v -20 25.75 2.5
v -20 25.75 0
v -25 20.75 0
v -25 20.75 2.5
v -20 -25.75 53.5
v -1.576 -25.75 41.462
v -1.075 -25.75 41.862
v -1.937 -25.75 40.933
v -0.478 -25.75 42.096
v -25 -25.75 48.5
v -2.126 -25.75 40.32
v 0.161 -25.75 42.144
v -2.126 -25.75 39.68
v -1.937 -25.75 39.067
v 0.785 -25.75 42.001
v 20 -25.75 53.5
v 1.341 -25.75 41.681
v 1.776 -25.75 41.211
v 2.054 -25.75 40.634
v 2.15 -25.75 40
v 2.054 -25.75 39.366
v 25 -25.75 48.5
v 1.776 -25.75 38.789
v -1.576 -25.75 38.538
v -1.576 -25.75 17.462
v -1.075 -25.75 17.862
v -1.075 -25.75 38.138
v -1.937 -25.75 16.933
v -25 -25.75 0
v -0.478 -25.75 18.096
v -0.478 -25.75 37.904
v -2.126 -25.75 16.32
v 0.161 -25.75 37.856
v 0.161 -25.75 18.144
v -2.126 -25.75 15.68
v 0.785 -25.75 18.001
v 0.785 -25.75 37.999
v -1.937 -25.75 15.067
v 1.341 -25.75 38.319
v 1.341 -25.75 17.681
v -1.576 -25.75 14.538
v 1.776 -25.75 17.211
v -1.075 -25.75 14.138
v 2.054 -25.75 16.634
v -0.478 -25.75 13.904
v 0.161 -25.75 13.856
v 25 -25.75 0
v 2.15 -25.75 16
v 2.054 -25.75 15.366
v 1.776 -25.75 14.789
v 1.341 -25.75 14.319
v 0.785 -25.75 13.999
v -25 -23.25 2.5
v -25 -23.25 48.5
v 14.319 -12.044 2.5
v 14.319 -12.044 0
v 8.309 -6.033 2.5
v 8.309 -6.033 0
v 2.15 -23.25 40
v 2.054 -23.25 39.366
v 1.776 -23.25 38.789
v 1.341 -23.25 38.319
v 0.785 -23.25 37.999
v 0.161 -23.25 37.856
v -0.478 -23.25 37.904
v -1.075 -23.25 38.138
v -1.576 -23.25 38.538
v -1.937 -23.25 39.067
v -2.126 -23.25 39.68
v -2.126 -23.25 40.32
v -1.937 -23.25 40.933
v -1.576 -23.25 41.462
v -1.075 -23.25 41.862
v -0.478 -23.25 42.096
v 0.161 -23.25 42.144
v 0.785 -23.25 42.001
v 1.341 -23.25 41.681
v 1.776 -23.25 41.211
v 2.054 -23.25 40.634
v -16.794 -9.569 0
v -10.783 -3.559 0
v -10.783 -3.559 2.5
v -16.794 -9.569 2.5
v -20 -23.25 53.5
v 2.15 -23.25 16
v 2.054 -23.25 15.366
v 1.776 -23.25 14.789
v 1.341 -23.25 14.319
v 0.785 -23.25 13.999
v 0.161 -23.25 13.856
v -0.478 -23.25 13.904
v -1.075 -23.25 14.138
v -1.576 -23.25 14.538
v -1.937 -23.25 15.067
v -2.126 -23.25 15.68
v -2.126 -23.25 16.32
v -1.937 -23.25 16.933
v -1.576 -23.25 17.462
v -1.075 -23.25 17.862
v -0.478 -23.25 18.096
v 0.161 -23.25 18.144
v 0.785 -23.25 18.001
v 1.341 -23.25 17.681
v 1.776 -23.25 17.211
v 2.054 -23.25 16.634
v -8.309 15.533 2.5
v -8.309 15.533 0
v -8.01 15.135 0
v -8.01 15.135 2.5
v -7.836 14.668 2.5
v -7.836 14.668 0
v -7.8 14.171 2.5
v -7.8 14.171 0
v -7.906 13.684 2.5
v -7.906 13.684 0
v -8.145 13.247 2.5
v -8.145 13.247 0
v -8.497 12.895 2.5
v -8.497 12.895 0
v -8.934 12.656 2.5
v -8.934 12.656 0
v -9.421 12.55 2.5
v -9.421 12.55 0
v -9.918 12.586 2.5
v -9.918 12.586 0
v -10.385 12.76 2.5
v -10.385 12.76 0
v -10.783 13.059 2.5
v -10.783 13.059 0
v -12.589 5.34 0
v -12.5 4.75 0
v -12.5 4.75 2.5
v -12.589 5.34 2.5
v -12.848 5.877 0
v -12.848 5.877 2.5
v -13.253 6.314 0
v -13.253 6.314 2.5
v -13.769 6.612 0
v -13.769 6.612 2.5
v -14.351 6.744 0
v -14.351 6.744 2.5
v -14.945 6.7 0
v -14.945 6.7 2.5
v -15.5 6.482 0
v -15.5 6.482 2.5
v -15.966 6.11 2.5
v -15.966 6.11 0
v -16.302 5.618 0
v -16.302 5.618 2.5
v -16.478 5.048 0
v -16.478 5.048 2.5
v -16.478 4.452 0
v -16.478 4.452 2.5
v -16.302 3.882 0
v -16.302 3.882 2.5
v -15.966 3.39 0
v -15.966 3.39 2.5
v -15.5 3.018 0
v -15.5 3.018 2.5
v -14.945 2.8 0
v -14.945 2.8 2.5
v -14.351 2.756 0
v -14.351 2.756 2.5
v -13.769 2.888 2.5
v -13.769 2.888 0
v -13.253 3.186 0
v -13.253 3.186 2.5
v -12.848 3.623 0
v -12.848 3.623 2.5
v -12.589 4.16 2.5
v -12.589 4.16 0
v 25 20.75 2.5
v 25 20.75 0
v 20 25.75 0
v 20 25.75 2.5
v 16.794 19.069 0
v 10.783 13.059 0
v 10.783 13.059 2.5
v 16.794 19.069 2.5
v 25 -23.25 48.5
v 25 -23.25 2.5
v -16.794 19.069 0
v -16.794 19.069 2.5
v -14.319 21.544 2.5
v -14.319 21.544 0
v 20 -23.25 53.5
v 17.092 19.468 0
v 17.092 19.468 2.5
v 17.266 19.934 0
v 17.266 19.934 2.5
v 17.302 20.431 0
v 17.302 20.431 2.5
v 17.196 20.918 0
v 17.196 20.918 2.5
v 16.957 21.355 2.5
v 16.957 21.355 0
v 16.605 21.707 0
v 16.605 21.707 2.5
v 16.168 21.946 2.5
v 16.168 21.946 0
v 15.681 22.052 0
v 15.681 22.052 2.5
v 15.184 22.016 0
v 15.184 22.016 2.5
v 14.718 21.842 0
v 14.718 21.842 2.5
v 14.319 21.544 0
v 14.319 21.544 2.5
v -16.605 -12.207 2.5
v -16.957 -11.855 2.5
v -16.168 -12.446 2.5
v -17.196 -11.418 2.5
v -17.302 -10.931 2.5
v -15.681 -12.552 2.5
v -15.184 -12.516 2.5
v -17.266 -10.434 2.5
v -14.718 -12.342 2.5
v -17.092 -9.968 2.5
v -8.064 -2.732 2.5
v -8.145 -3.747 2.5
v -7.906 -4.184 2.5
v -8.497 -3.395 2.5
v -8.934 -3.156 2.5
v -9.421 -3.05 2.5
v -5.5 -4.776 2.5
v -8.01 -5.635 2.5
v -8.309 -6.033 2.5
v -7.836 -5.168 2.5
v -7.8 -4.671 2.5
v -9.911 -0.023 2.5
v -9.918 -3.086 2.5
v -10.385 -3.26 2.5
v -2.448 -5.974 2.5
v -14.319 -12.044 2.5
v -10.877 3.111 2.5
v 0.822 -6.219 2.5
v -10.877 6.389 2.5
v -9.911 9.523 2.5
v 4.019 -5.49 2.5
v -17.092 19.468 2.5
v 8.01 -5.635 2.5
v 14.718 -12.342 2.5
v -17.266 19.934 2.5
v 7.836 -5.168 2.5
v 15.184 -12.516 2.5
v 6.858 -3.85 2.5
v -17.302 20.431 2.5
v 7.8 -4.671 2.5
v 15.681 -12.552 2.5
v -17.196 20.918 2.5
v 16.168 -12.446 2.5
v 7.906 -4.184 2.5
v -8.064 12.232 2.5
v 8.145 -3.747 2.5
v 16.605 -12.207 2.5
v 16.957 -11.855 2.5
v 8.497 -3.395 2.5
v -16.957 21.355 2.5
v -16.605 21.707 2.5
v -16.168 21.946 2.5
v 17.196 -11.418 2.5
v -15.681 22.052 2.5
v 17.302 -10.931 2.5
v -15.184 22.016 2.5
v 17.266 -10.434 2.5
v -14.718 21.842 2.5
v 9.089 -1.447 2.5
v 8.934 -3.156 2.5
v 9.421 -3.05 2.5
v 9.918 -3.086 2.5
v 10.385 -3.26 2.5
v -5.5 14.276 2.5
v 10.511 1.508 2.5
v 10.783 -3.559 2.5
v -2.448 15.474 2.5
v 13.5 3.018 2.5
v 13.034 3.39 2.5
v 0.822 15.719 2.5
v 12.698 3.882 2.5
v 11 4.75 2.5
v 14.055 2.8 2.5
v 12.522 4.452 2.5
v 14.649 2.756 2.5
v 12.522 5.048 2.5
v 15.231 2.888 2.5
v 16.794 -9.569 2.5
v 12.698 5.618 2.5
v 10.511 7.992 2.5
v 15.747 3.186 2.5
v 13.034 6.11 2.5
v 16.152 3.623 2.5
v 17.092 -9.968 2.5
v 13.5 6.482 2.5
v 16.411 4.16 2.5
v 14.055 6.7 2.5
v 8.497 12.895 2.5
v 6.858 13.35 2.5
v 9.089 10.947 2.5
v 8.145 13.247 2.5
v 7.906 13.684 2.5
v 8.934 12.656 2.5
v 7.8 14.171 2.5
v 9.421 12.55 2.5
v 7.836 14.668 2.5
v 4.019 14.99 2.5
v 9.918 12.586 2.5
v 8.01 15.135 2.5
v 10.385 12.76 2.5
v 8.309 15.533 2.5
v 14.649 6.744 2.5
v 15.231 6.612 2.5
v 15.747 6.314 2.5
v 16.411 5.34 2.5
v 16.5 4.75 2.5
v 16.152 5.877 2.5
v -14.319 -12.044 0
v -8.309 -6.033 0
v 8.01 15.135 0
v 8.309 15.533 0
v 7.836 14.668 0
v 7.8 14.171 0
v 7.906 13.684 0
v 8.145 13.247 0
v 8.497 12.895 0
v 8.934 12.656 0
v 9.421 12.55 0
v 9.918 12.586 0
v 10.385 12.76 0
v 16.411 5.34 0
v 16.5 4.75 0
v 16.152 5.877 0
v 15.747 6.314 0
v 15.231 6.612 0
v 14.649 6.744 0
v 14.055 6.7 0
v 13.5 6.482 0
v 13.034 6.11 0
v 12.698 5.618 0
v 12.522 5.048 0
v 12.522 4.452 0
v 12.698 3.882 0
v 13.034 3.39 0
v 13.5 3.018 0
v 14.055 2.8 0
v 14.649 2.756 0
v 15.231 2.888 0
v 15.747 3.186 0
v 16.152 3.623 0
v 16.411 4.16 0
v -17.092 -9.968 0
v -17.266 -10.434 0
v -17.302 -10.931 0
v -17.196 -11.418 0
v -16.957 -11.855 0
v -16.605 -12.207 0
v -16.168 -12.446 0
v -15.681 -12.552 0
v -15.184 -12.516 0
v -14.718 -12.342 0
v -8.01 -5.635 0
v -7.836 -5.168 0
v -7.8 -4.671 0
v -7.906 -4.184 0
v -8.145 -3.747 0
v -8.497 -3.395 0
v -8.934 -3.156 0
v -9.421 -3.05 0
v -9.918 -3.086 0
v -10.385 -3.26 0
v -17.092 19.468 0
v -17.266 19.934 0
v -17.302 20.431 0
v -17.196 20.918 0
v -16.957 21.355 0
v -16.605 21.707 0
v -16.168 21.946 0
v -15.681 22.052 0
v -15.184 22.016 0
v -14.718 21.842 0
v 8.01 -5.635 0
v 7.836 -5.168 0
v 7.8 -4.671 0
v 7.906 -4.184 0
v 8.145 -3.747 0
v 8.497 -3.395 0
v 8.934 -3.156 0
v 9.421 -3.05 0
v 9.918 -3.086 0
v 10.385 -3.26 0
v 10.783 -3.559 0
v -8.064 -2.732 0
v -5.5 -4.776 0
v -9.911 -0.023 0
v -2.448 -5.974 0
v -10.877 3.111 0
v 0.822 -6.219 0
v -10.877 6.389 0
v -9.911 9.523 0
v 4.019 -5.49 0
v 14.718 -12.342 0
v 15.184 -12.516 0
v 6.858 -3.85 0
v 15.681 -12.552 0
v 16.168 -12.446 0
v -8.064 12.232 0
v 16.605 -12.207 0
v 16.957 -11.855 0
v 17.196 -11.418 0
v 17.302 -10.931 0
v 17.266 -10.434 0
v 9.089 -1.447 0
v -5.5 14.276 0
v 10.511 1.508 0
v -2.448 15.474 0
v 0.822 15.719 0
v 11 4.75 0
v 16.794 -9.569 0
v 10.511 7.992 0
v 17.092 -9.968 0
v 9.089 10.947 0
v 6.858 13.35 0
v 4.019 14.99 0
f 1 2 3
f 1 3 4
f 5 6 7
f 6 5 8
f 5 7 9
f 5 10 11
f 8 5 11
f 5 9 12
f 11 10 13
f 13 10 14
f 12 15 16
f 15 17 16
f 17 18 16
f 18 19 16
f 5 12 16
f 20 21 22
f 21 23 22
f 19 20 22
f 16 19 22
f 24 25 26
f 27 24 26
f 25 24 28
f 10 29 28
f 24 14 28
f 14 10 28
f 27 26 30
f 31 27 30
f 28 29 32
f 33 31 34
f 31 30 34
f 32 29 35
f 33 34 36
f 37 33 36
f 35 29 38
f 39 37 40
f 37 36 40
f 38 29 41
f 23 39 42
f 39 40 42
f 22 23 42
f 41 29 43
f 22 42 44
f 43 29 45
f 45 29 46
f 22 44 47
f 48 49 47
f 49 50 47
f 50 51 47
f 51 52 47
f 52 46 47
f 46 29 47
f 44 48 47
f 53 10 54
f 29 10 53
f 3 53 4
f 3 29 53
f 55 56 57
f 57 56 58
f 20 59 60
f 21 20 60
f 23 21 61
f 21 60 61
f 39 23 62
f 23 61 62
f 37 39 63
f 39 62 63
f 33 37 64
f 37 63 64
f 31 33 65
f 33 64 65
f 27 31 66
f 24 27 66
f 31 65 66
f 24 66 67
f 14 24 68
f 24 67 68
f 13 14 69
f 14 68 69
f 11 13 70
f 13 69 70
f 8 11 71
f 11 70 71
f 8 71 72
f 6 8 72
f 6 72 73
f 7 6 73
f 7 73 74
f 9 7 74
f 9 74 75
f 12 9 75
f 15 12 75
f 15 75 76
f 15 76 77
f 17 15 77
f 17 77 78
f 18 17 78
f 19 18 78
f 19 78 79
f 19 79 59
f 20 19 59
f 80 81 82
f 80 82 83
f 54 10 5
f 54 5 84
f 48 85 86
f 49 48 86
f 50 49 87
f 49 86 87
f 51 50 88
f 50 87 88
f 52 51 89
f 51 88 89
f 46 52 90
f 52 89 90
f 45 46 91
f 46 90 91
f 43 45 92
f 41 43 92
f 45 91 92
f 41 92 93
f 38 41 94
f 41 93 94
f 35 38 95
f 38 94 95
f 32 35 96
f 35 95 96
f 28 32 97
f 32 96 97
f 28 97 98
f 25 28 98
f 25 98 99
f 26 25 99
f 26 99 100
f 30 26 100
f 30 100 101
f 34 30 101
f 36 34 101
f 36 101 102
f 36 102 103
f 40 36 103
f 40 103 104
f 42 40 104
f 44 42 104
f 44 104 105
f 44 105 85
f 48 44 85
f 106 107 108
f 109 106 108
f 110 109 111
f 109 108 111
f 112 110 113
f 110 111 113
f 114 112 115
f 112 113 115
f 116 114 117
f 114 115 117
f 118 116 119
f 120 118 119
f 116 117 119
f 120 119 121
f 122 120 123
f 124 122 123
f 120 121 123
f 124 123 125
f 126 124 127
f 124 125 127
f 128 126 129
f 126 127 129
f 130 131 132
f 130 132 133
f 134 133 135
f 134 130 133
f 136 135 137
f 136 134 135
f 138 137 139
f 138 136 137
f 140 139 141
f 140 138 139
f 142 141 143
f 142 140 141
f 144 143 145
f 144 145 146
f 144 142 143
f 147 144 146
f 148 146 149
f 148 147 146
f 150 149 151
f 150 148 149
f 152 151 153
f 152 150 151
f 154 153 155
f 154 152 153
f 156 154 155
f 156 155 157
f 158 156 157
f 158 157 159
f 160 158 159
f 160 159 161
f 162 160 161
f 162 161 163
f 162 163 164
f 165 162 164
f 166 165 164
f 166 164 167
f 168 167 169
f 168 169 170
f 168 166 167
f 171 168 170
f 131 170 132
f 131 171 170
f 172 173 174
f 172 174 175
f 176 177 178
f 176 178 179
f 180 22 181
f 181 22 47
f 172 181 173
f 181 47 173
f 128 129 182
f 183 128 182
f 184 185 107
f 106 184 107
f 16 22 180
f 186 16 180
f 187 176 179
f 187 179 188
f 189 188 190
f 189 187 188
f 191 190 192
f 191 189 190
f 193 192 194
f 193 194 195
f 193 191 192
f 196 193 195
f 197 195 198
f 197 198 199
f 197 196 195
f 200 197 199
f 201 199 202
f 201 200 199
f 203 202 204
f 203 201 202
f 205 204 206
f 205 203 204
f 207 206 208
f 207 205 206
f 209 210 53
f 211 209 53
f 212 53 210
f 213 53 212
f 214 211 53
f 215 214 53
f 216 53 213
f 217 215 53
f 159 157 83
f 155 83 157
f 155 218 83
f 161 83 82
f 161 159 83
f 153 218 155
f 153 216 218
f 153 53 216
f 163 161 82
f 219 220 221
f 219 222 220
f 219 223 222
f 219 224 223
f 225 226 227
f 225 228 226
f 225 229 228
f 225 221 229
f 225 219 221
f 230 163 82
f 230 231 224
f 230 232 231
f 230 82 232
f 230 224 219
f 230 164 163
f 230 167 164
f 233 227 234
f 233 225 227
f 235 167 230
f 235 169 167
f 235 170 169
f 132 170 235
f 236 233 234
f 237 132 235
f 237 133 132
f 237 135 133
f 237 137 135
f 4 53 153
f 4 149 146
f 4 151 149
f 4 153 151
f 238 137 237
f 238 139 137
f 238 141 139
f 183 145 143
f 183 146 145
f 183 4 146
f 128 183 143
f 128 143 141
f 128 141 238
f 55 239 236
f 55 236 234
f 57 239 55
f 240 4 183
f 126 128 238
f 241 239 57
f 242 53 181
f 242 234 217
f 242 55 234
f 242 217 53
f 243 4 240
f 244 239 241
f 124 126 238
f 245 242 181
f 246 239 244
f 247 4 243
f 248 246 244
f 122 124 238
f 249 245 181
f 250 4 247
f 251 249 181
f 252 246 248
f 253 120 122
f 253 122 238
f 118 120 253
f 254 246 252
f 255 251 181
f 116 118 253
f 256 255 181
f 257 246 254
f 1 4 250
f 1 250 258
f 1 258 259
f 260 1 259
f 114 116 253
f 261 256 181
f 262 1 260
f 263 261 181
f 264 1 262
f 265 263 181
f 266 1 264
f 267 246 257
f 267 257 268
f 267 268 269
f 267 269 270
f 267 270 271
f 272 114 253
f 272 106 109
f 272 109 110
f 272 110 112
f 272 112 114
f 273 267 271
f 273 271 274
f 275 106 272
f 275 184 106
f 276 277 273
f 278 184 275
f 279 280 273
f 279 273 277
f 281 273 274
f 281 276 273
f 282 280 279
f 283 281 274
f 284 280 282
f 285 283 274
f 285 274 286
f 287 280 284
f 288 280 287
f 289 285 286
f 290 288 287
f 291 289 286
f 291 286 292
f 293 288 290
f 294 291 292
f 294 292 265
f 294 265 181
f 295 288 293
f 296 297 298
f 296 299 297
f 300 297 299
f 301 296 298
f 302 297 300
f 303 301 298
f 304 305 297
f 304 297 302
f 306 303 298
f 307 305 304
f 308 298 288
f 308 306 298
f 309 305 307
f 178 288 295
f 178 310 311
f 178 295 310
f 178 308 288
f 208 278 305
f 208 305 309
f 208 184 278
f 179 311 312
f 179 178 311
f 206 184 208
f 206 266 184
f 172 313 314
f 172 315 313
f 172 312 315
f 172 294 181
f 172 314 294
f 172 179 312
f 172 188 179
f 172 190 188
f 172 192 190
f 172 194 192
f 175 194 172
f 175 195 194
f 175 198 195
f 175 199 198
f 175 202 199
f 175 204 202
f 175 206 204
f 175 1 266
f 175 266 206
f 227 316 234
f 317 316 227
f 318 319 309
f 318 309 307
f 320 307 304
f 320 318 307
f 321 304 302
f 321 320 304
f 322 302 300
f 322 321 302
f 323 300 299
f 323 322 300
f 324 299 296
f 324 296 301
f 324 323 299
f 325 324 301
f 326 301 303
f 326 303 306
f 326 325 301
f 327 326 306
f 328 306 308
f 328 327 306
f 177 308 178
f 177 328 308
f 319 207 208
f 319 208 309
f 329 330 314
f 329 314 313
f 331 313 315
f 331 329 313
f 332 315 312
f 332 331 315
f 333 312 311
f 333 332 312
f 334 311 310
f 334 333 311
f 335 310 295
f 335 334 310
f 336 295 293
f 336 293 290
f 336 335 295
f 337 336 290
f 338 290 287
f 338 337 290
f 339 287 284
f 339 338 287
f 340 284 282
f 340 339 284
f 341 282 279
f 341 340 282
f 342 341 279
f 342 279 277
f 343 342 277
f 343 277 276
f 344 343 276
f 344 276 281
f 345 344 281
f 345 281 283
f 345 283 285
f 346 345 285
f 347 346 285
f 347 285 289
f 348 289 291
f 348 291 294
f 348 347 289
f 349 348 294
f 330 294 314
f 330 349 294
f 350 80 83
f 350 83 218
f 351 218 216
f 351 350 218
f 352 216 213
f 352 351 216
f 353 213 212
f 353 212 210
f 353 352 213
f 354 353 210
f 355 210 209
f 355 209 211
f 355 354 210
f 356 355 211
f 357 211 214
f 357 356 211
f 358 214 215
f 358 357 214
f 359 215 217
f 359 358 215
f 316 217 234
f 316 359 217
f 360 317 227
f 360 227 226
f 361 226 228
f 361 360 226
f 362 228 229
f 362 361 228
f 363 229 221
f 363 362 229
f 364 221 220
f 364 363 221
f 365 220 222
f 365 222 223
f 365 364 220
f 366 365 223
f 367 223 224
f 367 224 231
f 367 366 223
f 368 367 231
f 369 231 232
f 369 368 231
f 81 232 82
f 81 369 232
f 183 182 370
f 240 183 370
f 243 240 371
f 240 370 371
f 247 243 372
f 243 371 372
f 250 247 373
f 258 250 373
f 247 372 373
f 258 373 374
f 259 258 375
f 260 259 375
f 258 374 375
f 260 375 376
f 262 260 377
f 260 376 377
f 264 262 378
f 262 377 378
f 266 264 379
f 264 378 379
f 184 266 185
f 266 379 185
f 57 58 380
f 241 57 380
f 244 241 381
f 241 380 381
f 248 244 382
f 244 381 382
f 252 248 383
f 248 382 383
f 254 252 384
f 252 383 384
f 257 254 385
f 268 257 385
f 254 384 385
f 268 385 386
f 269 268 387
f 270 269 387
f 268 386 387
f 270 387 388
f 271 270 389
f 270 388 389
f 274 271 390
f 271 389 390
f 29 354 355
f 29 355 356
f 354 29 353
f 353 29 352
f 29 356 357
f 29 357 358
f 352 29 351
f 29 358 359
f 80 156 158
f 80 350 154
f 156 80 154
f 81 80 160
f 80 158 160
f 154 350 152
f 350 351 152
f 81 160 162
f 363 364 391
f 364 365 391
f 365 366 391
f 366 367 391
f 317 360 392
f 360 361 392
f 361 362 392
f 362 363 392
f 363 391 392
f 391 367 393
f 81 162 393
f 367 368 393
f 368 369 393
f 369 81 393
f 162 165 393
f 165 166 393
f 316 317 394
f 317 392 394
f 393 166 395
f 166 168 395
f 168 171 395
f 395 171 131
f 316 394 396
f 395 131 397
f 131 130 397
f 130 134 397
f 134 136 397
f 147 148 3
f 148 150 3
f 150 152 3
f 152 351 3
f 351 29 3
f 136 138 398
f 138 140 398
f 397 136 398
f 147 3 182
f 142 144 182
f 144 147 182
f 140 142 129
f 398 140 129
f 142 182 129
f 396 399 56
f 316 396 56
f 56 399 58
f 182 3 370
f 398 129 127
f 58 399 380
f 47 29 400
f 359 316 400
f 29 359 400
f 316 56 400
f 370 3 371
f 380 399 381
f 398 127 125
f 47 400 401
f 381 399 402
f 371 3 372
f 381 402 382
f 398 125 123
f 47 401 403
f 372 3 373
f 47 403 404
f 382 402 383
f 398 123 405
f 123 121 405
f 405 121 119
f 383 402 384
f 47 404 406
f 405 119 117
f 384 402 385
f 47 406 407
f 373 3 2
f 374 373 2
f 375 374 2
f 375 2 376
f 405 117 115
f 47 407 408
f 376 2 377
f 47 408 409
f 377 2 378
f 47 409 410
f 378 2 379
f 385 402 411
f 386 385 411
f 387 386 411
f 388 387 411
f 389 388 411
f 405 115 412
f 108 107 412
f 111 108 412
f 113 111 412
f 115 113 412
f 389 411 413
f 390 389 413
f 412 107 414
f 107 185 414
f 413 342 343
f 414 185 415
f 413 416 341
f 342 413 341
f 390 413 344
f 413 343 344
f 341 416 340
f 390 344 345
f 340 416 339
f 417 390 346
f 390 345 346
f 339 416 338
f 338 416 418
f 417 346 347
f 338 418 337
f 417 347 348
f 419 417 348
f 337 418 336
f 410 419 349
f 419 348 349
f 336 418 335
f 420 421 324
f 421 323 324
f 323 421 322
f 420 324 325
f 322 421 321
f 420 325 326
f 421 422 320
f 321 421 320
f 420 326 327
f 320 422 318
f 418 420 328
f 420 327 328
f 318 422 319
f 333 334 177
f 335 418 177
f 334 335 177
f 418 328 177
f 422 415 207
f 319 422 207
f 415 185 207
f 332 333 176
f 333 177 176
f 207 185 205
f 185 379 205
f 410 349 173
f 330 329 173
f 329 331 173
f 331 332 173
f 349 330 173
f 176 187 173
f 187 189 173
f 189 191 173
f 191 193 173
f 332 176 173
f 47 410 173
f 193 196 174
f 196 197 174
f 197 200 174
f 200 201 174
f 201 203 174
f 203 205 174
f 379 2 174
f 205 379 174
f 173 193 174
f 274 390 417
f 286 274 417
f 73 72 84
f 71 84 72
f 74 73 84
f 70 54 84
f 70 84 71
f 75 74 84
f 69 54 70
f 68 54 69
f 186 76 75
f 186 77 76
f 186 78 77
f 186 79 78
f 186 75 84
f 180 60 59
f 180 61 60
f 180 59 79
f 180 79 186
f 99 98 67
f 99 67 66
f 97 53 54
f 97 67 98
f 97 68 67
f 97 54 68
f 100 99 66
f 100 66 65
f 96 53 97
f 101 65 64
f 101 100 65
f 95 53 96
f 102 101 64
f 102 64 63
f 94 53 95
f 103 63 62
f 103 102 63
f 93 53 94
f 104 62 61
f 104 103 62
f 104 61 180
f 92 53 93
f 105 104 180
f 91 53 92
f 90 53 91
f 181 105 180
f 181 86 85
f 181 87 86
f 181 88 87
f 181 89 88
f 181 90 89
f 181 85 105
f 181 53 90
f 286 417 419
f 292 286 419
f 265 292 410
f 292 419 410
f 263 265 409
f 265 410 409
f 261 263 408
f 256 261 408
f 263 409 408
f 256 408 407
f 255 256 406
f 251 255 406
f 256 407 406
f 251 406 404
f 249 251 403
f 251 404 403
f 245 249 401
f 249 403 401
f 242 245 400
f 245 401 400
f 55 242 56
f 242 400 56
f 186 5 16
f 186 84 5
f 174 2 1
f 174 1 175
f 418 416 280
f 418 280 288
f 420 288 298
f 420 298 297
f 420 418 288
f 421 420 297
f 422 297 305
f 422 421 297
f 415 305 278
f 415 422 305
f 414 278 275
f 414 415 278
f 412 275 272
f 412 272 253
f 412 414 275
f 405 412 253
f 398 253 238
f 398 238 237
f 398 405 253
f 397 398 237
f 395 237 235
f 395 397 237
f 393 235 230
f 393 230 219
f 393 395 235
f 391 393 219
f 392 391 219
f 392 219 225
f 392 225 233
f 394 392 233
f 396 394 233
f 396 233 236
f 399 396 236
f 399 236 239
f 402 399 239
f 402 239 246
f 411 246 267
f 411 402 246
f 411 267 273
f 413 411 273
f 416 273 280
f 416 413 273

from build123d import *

# Parameters (mm, degrees)
SKETCH_14_W         = 50
SKETCH_14_H         = 51.5
SKETCH_14_R         = 11
SKETCH_14_R_2       = 2
EXTRUDE_1_DEPTH     = 2.5
SKETCH_16_W         = 50
SKETCH_16_H         = 2.5
EXTRUDE_2_DEPTH     = 51
SKETCH_17_R         = 2.15
CUT_EXTRUDE_1_DEPTH = 3.5
CHAMFER_1_SIZE      = 5


with BuildPart() as part:
    # 草图14 → 凸台-拉伸1 (new body)
    with BuildSketch(Plane.XY):
        Rectangle(SKETCH_14_W, SKETCH_14_H)
        with Locations((0, 4.75)):
            Circle(SKETCH_14_R, mode=Mode.SUBTRACT)
        with Locations((-14.5, 4.75)):
            Circle(SKETCH_14_R_2, mode=Mode.SUBTRACT)
        with Locations((14.5, 4.75)):
            Circle(SKETCH_14_R_2, mode=Mode.SUBTRACT)
        with BuildLine():
            Line((-14.318912319, 21.543786053), (-8.308504679, 15.533378413))
            ThreePointArc((-8.308504679, 15.533378413), (-8.308504679, 13.058504679), (-10.783378413, 13.058504679))
            Line((-10.783378413, 13.058504679), (-16.793786053, 19.068912319))
            ThreePointArc((-16.793786053, 19.068912319), (-16.793786053, 21.543786053), (-14.318912319, 21.543786053))
        make_face(mode=Mode.SUBTRACT)
        with BuildLine():
            Line((14.318912319, 21.543786053), (8.308504679, 15.533378413))
            ThreePointArc((8.308504679, 15.533378413), (8.308504679, 13.058504679), (10.783378413, 13.058504679))
            Line((10.783378413, 13.058504679), (16.793786053, 19.068912319))
            ThreePointArc((16.793786053, 19.068912319), (16.793786053, 21.543786053), (14.318912319, 21.543786053))
        make_face(mode=Mode.SUBTRACT)
        with BuildLine():
            Line((-14.318912319, -12.043786053), (-8.308504679, -6.033378413))
            ThreePointArc((-8.308504679, -6.033378413), (-8.308504679, -3.558504679), (-10.783378413, -3.558504679))
            Line((-10.783378413, -3.558504679), (-16.793786053, -9.568912319))
            ThreePointArc((-16.793786053, -9.568912319), (-16.793786053, -12.043786053), (-14.318912319, -12.043786053))
        make_face(mode=Mode.SUBTRACT)
        with BuildLine():
            Line((14.318912319, -12.043786053), (8.308504679, -6.033378413))
            ThreePointArc((8.308504679, -6.033378413), (8.308504679, -3.558504679), (10.783378413, -3.558504679))
            Line((10.783378413, -3.558504679), (16.793786053, -9.568912319))
            ThreePointArc((16.793786053, -9.568912319), (16.793786053, -12.043786053), (14.318912319, -12.043786053))
        make_face(mode=Mode.SUBTRACT)
    extrude(amount=EXTRUDE_1_DEPTH)

    # 草图16 → 凸台-拉伸2 (add)
    with BuildSketch(Plane.XY.offset(2.5)):
        with Locations((0, -24.5)):
            Rectangle(SKETCH_16_W, SKETCH_16_H)
    extrude(amount=EXTRUDE_2_DEPTH)

    # 草图17 → 切除-拉伸1 (cut, through all)
    with BuildSketch(Plane(origin=(0, -23.25, 0), x_dir=(1, 0, 0), z_dir=(0, 1, 0))):
        with Locations((0, -40)):
            Circle(SKETCH_17_R)
        with Locations((0, -16)):
            Circle(SKETCH_17_R)
    extrude(amount=-CUT_EXTRUDE_1_DEPTH, mode=Mode.SUBTRACT)

    # 倒角1
    chamfer_1_edges = [part.edges().sort_by_distance(p)[0] for p in [
        (-25, 25.75, 1.25),
        (25, 25.75, 1.25),
        (-25, -24.5, 53.5),
        (25, -24.5, 53.5),
    ]]
    chamfer(chamfer_1_edges, length=CHAMFER_1_SIZE)


solid = part.part
